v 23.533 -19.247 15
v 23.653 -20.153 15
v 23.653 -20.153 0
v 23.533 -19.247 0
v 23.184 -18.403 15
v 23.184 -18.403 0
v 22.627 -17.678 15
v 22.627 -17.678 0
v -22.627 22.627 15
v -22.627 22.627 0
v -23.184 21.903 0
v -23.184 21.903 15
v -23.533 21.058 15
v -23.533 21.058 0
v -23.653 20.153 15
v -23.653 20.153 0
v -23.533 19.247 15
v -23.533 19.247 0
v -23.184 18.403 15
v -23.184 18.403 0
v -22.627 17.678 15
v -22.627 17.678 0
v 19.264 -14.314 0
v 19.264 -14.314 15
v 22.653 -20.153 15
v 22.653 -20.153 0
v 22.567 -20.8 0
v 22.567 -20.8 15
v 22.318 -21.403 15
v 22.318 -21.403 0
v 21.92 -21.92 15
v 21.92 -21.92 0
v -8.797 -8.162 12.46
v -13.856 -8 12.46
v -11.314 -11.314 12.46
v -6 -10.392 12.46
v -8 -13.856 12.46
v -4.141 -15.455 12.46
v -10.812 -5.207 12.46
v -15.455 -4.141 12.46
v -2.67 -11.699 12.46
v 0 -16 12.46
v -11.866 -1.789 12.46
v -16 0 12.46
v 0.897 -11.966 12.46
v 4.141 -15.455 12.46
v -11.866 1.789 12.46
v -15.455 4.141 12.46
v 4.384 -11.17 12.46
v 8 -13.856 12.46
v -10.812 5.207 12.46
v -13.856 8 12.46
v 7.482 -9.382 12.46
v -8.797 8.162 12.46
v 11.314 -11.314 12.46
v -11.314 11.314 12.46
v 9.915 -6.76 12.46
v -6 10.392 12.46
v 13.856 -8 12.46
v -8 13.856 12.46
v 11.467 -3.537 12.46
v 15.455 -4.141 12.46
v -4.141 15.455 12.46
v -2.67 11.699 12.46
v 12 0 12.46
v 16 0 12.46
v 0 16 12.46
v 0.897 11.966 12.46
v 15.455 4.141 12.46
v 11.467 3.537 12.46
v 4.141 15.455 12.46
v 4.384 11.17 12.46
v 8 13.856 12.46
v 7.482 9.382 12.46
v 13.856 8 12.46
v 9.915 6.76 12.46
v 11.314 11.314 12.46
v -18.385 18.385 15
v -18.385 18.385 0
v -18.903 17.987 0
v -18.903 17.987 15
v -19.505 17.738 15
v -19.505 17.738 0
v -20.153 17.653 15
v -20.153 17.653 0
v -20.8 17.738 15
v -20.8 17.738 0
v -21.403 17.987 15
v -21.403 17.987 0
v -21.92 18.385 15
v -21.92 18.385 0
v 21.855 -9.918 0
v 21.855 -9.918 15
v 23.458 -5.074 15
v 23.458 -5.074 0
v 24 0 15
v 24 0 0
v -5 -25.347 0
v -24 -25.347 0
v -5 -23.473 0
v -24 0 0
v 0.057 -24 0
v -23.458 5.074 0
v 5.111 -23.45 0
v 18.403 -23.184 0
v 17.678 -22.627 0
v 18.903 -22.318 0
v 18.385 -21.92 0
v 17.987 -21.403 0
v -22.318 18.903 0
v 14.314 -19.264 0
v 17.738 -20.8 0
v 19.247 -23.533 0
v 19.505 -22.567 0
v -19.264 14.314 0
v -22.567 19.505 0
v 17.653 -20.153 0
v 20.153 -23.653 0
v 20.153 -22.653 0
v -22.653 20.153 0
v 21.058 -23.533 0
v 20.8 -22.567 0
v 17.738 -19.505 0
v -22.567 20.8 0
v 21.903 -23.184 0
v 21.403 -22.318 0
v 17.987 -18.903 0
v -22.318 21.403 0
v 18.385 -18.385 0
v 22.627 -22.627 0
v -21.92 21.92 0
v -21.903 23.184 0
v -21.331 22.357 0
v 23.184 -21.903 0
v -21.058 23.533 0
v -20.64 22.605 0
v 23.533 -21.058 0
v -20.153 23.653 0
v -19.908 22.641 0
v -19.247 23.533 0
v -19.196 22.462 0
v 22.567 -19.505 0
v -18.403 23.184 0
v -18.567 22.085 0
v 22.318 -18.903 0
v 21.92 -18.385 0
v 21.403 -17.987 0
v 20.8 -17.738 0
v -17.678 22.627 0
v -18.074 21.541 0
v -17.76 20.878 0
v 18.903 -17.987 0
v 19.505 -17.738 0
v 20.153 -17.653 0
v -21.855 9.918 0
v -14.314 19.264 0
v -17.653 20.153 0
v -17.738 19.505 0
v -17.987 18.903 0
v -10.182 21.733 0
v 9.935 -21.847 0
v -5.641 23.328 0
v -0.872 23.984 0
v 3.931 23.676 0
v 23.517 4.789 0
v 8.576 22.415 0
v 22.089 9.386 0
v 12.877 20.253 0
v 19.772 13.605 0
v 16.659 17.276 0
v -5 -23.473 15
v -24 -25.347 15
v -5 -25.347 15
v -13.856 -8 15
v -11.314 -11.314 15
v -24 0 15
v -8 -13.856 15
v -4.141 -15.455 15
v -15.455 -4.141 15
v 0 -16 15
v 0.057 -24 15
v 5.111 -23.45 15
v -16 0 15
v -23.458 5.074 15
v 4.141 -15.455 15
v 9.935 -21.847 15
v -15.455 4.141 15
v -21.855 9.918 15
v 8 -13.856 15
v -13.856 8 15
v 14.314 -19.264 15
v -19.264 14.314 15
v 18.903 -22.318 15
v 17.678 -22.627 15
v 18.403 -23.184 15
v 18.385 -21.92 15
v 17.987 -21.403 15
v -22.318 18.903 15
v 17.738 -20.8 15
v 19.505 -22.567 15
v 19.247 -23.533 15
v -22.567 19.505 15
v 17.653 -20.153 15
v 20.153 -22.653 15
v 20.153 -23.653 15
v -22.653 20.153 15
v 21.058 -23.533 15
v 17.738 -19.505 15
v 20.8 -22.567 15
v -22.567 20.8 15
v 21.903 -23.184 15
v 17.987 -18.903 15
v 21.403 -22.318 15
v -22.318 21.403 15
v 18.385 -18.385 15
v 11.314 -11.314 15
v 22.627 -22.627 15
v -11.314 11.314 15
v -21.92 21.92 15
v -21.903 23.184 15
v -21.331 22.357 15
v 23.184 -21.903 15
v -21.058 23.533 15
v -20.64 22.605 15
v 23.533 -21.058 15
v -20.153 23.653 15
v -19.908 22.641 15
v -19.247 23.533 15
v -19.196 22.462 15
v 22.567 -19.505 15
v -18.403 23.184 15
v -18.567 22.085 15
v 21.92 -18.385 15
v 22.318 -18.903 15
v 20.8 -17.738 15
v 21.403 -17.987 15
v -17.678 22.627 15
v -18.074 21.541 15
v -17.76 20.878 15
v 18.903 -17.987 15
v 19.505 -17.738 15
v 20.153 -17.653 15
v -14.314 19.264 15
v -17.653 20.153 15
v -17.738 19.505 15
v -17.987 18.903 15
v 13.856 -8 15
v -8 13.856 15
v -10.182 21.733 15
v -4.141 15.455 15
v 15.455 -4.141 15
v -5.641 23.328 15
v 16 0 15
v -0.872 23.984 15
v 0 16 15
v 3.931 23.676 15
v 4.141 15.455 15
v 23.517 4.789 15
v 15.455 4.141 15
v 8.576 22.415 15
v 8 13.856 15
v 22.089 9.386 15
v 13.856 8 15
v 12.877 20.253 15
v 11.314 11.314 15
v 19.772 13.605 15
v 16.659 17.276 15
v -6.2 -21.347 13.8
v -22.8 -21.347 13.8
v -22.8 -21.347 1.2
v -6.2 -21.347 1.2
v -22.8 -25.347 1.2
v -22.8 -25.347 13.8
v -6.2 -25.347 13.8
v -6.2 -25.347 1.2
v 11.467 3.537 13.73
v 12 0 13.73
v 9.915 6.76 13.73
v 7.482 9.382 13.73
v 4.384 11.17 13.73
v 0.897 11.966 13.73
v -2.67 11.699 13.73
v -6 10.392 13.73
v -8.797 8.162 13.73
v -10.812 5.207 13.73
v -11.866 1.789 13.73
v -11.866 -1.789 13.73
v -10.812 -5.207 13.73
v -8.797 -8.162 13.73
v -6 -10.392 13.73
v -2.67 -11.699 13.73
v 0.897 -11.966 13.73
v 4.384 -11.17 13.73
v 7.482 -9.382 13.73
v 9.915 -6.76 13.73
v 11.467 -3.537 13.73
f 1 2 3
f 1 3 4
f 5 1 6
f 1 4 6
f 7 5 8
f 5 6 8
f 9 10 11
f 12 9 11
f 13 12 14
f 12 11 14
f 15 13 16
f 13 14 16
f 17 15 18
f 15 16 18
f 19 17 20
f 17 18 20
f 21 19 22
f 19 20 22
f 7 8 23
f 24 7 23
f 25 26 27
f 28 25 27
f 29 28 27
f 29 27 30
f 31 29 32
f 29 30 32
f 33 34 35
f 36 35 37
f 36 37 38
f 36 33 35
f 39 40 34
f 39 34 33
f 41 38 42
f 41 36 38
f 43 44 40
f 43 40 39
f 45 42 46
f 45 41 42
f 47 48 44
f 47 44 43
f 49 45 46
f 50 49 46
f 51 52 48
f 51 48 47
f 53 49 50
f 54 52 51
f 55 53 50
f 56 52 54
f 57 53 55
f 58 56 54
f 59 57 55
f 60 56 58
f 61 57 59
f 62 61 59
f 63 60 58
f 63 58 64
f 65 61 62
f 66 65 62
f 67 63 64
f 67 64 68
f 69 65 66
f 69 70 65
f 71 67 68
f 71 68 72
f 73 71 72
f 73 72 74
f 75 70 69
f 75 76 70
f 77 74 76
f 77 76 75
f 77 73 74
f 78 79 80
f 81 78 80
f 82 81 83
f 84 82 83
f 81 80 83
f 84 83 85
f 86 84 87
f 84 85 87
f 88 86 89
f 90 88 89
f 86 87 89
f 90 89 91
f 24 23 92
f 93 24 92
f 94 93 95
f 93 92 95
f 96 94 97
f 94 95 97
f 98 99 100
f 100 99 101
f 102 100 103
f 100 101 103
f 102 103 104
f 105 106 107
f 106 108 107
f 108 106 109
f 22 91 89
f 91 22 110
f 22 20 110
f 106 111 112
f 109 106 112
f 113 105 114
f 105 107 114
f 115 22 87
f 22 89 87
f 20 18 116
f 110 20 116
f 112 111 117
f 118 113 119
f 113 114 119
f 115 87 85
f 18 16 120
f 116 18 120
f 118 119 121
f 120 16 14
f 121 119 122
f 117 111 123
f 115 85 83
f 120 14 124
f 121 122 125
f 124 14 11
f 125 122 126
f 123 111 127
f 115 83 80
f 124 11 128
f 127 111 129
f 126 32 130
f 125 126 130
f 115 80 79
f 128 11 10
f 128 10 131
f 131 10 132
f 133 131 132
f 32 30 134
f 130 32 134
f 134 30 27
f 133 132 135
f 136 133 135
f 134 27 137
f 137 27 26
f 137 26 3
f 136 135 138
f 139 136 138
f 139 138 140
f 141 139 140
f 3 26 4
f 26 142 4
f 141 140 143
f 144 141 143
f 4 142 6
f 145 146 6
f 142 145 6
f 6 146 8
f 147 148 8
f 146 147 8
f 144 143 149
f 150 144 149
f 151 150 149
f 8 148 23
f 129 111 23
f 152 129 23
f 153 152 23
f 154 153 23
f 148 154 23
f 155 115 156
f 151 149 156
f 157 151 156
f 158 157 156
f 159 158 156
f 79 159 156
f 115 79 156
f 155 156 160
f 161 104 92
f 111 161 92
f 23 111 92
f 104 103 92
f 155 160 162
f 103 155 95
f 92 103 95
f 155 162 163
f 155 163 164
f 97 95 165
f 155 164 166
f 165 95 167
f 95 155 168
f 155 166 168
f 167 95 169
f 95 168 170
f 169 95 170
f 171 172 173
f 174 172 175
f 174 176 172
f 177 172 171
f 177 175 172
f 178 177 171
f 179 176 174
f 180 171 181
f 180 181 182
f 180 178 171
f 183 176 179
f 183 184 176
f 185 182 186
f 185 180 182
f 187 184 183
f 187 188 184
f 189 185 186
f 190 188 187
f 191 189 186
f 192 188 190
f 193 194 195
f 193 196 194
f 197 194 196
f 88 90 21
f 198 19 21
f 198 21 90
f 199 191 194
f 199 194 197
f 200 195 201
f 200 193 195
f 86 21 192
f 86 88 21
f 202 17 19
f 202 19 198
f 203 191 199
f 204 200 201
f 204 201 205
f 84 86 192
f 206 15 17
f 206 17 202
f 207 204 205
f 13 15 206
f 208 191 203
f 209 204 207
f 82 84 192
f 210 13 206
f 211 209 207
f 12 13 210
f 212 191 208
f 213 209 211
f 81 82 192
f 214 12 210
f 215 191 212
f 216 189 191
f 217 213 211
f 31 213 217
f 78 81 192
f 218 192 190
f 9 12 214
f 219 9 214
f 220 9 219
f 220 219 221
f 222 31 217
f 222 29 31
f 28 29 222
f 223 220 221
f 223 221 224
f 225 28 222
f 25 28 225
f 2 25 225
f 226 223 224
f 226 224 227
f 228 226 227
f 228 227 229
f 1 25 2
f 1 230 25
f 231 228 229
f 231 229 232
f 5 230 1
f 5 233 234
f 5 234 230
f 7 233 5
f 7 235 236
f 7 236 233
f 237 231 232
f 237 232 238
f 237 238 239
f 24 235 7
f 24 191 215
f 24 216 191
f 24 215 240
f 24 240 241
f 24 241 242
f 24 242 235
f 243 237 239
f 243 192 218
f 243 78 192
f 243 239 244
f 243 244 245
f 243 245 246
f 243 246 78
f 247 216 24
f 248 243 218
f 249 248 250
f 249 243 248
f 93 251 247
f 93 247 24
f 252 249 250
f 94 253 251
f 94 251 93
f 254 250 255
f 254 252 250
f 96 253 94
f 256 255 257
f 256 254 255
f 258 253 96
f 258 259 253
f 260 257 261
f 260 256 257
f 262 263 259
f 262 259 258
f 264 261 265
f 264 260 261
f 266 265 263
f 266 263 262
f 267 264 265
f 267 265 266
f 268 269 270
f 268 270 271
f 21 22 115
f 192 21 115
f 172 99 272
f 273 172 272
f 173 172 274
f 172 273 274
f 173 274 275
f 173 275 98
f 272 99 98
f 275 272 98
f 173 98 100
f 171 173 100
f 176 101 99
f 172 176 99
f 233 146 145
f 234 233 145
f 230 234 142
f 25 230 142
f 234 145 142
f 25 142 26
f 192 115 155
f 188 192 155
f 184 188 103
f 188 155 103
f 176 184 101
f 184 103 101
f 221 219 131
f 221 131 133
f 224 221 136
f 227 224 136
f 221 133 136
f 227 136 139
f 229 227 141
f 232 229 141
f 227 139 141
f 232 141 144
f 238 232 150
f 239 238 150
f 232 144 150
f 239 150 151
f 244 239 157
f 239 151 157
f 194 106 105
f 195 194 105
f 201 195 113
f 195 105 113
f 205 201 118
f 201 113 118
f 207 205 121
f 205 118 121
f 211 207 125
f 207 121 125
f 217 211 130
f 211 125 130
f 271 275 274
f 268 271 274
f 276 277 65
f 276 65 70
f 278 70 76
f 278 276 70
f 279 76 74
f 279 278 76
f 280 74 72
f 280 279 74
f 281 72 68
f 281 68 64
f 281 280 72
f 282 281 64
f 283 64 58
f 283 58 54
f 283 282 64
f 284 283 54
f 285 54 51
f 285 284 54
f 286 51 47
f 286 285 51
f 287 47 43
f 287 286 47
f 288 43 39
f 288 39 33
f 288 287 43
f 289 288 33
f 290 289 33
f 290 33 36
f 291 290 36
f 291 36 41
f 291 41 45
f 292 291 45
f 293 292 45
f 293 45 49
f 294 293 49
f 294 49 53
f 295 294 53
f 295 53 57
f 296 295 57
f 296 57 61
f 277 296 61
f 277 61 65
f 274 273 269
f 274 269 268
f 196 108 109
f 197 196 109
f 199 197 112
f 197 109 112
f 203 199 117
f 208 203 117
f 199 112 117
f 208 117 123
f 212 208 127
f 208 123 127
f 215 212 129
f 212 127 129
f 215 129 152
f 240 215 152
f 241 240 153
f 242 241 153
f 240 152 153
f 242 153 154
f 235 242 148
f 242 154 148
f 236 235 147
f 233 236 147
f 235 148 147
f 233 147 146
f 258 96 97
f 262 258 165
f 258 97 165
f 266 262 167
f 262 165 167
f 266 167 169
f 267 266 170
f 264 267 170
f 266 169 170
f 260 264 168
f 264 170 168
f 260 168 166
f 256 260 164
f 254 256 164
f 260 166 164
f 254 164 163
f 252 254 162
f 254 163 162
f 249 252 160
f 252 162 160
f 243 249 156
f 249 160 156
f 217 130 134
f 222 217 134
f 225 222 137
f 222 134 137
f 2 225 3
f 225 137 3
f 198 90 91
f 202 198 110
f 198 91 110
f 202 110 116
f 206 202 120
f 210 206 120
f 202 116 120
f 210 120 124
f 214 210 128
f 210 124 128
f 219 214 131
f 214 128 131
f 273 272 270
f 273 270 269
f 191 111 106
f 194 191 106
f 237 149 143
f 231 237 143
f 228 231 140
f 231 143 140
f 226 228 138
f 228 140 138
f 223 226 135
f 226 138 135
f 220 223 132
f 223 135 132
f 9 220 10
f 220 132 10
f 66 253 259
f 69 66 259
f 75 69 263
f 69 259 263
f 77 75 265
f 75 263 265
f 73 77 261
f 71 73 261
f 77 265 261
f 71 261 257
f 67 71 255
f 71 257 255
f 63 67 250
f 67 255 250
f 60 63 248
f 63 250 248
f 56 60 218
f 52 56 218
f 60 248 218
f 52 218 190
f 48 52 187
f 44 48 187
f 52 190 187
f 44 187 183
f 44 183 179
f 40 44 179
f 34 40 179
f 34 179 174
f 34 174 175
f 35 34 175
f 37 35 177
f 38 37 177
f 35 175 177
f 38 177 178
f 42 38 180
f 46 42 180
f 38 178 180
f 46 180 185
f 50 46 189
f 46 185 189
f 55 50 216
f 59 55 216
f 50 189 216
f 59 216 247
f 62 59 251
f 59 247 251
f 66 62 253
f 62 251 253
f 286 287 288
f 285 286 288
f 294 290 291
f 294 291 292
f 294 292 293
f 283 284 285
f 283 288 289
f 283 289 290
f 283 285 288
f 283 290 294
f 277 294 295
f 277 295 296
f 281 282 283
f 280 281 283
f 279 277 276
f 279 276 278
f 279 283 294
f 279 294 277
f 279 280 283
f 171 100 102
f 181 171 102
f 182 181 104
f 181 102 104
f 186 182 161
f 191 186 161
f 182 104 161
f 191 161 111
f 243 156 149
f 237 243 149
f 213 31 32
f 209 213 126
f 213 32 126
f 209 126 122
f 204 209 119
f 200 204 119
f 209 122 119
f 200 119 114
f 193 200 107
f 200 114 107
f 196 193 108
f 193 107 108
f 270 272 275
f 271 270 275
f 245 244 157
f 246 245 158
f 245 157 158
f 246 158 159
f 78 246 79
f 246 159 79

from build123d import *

# Parameters (mm, degrees)
BOSS_EXTRUDE1_DEPTH = 15
SKETCH2_W           = 16.6
SKETCH2_H           = 12.6
CUT_EXTRUDE1_DEPTH  = 4
SKETCH3_R           = 16
SKETCH3_R_2         = 12
CUT_EXTRUDE2_DEPTH  = 2.54
SKETCH4_R           = 12
CUT_EXTRUDE3_DEPTH  = 1.27


with BuildPart() as part:
    # Sketch1 → Boss-Extrude1 (new body)
    with BuildSketch(Plane.XY):
        with BuildLine():
            ThreePointArc((-5, -23.473389189), (-18.654758106, -15.099668871), (-24, 0))
            Line((-24, 0), (-24, -25.347456736))
            Line((-24, -25.347456736), (-5, -25.347456736))
            Line((-5, -25.347456736), (-5, -23.473389189))
        make_face()
        with BuildLine():
            Line((-4.949747468, 0), (-19.264007125, 14.314259656))
            ThreePointArc((-19.264007125, 14.314259656), (-22.785260268, 7.538694483), (-24, 0))
            Line((-24, 0), (-4.949747468, 0))
        make_face()
        with BuildLine():
            Line((14.314259656, -19.264007125), (-4.949747468, 0))
            Line((-4.949747468, 0), (-24, 0))
            ThreePointArc((-24, 0), (-18.654758106, -15.099668871), (-5, -23.473389189))
            ThreePointArc((-5, -23.473389189), (5.110634264, -23.449550474), (14.314259656, -19.264007125))
        make_face()
        with BuildLine():
            Line((-4.949747468, 0), (-19.264007125, 14.314259656))
            ThreePointArc((-19.264007125, 14.314259656), (-22.785260268, 7.538694483), (-24, 0))
            Line((-24, 0), (-4.949747468, 0))
        make_face()
        with BuildLine():
            Line((14.314259656, -19.264007125), (-4.949747468, 0))
            Line((-4.949747468, 0), (-24, 0))
            ThreePointArc((-24, 0), (-18.654758106, -15.099668871), (-5, -23.473389189))
            ThreePointArc((-5, -23.473389189), (5.110634264, -23.449550474), (14.314259656, -19.264007125))
        make_face()
        with BuildLine():
            Line((0, 0), (-16.970562748, 16.970562748))
            ThreePointArc((-16.970562748, 16.970562748), (-18.165902125, 15.684387141), (-19.264007125, 14.314259656))
            Line((-19.264007125, 14.314259656), (-4.949747468, 0))
            Line((-4.949747468, 0), (0, 0))
        make_face()
        with BuildLine():
            Line((16.970562748, -16.970562748), (0, 0))
            Line((0, 0), (-4.949747468, 0))
            Line((-4.949747468, 0), (14.314259656, -19.264007125))
            ThreePointArc((14.314259656, -19.264007125), (15.684387141, -18.165902125), (16.970562748, -16.970562748))
        make_face()
        with BuildLine():
            ThreePointArc((-14.314259656, 19.264007125), (-15.684387141, 18.165902125), (-16.970562748, 16.970562748))
            Line((-16.970562748, 16.970562748), (0, 0))
            Line((0, 0), (16.970562748, -16.970562748))
            ThreePointArc((16.970562748, -16.970562748), (18.165902125, -15.684387141), (19.264007125, -14.314259656))
            Line((19.264007125, -14.314259656), (-14.314259656, 19.264007125))
        make_face()
        with BuildLine():
            ThreePointArc((24, 0), (10.780950057, 21.442274037), (-14.314259656, 19.264007125))
            Line((-14.314259656, 19.264007125), (19.264007125, -14.314259656))
            ThreePointArc((19.264007125, -14.314259656), (22.785260268, -7.538694483), (24, 0))
        make_face()
        with BuildLine():
            Line((-16.970562748, 16.970562748), (-17.67766953, 17.67766953))
            ThreePointArc((-17.67766953, 17.67766953), (-20.152543264, 16.652543264), (-22.627416998, 17.67766953))
            Line((-22.627416998, 17.67766953), (-19.264007125, 14.314259656))
            ThreePointArc((-19.264007125, 14.314259656), (-18.165902125, 15.684387141), (-16.970562748, 16.970562748))
        make_face()
        with BuildLine():
            ThreePointArc((-16.652543264, 20.152543264), (-16.9189649, 18.813151251), (-17.67766953, 17.67766953))
            Line((-17.67766953, 17.67766953), (-16.970562748, 16.970562748))
            ThreePointArc((-16.970562748, 16.970562748), (-15.684387141, 18.165902125), (-14.314259656, 19.264007125))
            Line((-14.314259656, 19.264007125), (-17.67766953, 22.627416998))
            ThreePointArc((-17.67766953, 22.627416998), (-16.9189649, 21.491935277), (-16.652543264, 20.152543264))
        make_face()
        with BuildLine():
            ThreePointArc((23.652543264, -20.152543264), (23.386121628, -18.813151251), (22.627416998, -17.67766953))
            Line((22.627416998, -17.67766953), (21.920310217, -18.384776311))
            ThreePointArc((21.920310217, -18.384776311), (22.462242095, -19.195834683), (22.652543264, -20.152543264))
            ThreePointArc((22.652543264, -20.152543264), (22.462242095, -21.109251845), (21.920310217, -21.920310217))
            Line((21.920310217, -21.920310217), (22.627416998, -22.627416998))
            ThreePointArc((22.627416998, -22.627416998), (23.386121628, -21.491935277), (23.652543264, -20.152543264))
        make_face()
        with BuildLine():
            Line((21.920310217, -18.384776311), (22.627416998, -17.67766953))
            ThreePointArc((22.627416998, -17.67766953), (20.152543264, -16.652543264), (17.67766953, -17.67766953))
            Line((17.67766953, -17.67766953), (18.384776311, -18.384776311))
            ThreePointArc((18.384776311, -18.384776311), (20.152543264, -17.652543264), (21.920310217, -18.384776311))
        make_face()
        with BuildLine():
            Line((18.384776311, -18.384776311), (17.67766953, -17.67766953))
            ThreePointArc((17.67766953, -17.67766953), (16.652543264, -20.152543264), (17.67766953, -22.627416998))
            Line((17.67766953, -22.627416998), (18.384776311, -21.920310217))
            ThreePointArc((18.384776311, -21.920310217), (17.652543264, -20.152543264), (18.384776311, -18.384776311))
        make_face()
        with BuildLine():
            Line((18.384776311, -21.920310217), (17.67766953, -22.627416998))
            ThreePointArc((17.67766953, -22.627416998), (20.152543264, -23.652543264), (22.627416998, -22.627416998))
            Line((22.627416998, -22.627416998), (21.920310217, -21.920310217))
            ThreePointArc((21.920310217, -21.920310217), (20.152543264, -22.652543264), (18.384776311, -21.920310217))
        make_face()
        with BuildLine():
            ThreePointArc((23.652543264, -20.152543264), (23.386121628, -18.813151251), (22.627416998, -17.67766953))
            Line((22.627416998, -17.67766953), (21.920310217, -18.384776311))
            ThreePointArc((21.920310217, -18.384776311), (22.462242095, -19.195834683), (22.652543264, -20.152543264))
            ThreePointArc((22.652543264, -20.152543264), (22.462242095, -21.109251845), (21.920310217, -21.920310217))
            Line((21.920310217, -21.920310217), (22.627416998, -22.627416998))
            ThreePointArc((22.627416998, -22.627416998), (23.386121628, -21.491935277), (23.652543264, -20.152543264))
        make_face()
        with BuildLine():
            Line((21.920310217, -18.384776311), (22.627416998, -17.67766953))
            ThreePointArc((22.627416998, -17.67766953), (20.152543264, -16.652543264), (17.67766953, -17.67766953))
            Line((17.67766953, -17.67766953), (18.384776311, -18.384776311))
            ThreePointArc((18.384776311, -18.384776311), (20.152543264, -17.652543264), (21.920310217, -18.384776311))
        make_face()
        with BuildLine():
            Line((18.384776311, -18.384776311), (17.67766953, -17.67766953))
            ThreePointArc((17.67766953, -17.67766953), (16.652543264, -20.152543264), (17.67766953, -22.627416998))
            Line((17.67766953, -22.627416998), (18.384776311, -21.920310217))
            ThreePointArc((18.384776311, -21.920310217), (17.652543264, -20.152543264), (18.384776311, -18.384776311))
        make_face()
        with BuildLine():
            Line((18.384776311, -21.920310217), (17.67766953, -22.627416998))
            ThreePointArc((17.67766953, -22.627416998), (20.152543264, -23.652543264), (22.627416998, -22.627416998))
            Line((22.627416998, -22.627416998), (21.920310217, -21.920310217))
            ThreePointArc((21.920310217, -21.920310217), (20.152543264, -22.652543264), (18.384776311, -21.920310217))
        make_face()
        with BuildLine():
            Line((17.67766953, -17.67766953), (16.970562748, -16.970562748))
            ThreePointArc((16.970562748, -16.970562748), (15.684387141, -18.165902125), (14.314259656, -19.264007125))
            Line((14.314259656, -19.264007125), (17.67766953, -22.627416998))
            ThreePointArc((17.67766953, -22.627416998), (16.652543264, -20.152543264), (17.67766953, -17.67766953))
        make_face()
        with BuildLine():
            Line((22.627416998, -17.67766953), (19.264007125, -14.314259656))
            ThreePointArc((19.264007125, -14.314259656), (18.165902125, -15.684387141), (16.970562748, -16.970562748))
            Line((16.970562748, -16.970562748), (17.67766953, -17.67766953))
            ThreePointArc((17.67766953, -17.67766953), (20.152543264, -16.652543264), (22.627416998, -17.67766953))
        make_face()
        with BuildLine():
            ThreePointArc((23.652543264, -20.152543264), (23.386121628, -18.813151251), (22.627416998, -17.67766953))
            Line((22.627416998, -17.67766953), (21.920310217, -18.384776311))
            ThreePointArc((21.920310217, -18.384776311), (22.462242095, -19.195834683), (22.652543264, -20.152543264))
            ThreePointArc((22.652543264, -20.152543264), (22.462242095, -21.109251845), (21.920310217, -21.920310217))
            Line((21.920310217, -21.920310217), (22.627416998, -22.627416998))
            ThreePointArc((22.627416998, -22.627416998), (23.386121628, -21.491935277), (23.652543264, -20.152543264))
        make_face()
        with BuildLine():
            Line((21.920310217, -18.384776311), (22.627416998, -17.67766953))
            ThreePointArc((22.627416998, -17.67766953), (20.152543264, -16.652543264), (17.67766953, -17.67766953))
            Line((17.67766953, -17.67766953), (18.384776311, -18.384776311))
            ThreePointArc((18.384776311, -18.384776311), (20.152543264, -17.652543264), (21.920310217, -18.384776311))
        make_face()
        with BuildLine():
            Line((18.384776311, -18.384776311), (17.67766953, -17.67766953))
            ThreePointArc((17.67766953, -17.67766953), (16.652543264, -20.152543264), (17.67766953, -22.627416998))
            Line((17.67766953, -22.627416998), (18.384776311, -21.920310217))
            ThreePointArc((18.384776311, -21.920310217), (17.652543264, -20.152543264), (18.384776311, -18.384776311))
        make_face()
        with BuildLine():
            Line((18.384776311, -21.920310217), (17.67766953, -22.627416998))
            ThreePointArc((17.67766953, -22.627416998), (20.152543264, -23.652543264), (22.627416998, -22.627416998))
            Line((22.627416998, -22.627416998), (21.920310217, -21.920310217))
            ThreePointArc((21.920310217, -21.920310217), (20.152543264, -22.652543264), (18.384776311, -21.920310217))
        make_face()
        with BuildLine():
            ThreePointArc((23.652543264, -20.152543264), (23.386121628, -18.813151251), (22.627416998, -17.67766953))
            Line((22.627416998, -17.67766953), (21.920310217, -18.384776311))
            ThreePointArc((21.920310217, -18.384776311), (22.462242095, -19.195834683), (22.652543264, -20.152543264))
            ThreePointArc((22.652543264, -20.152543264), (22.462242095, -21.109251845), (21.920310217, -21.920310217))
            Line((21.920310217, -21.920310217), (22.627416998, -22.627416998))
            ThreePointArc((22.627416998, -22.627416998), (23.386121628, -21.491935277), (23.652543264, -20.152543264))
        make_face()
        with BuildLine():
            Line((21.920310217, -18.384776311), (22.627416998, -17.67766953))
            ThreePointArc((22.627416998, -17.67766953), (20.152543264, -16.652543264), (17.67766953, -17.67766953))
            Line((17.67766953, -17.67766953), (18.384776311, -18.384776311))
            ThreePointArc((18.384776311, -18.384776311), (20.152543264, -17.652543264), (21.920310217, -18.384776311))
        make_face()
        with BuildLine():
            Line((18.384776311, -18.384776311), (17.67766953, -17.67766953))
            ThreePointArc((17.67766953, -17.67766953), (16.652543264, -20.152543264), (17.67766953, -22.627416998))
            Line((17.67766953, -22.627416998), (18.384776311, -21.920310217))
            ThreePointArc((18.384776311, -21.920310217), (17.652543264, -20.152543264), (18.384776311, -18.384776311))
        make_face()
        with BuildLine():
            Line((18.384776311, -21.920310217), (17.67766953, -22.627416998))
            ThreePointArc((17.67766953, -22.627416998), (20.152543264, -23.652543264), (22.627416998, -22.627416998))
            Line((22.627416998, -22.627416998), (21.920310217, -21.920310217))
            ThreePointArc((21.920310217, -21.920310217), (20.152543264, -22.652543264), (18.384776311, -21.920310217))
        make_face()
        with BuildLine():
            ThreePointArc((-21.920310217, 18.384776311), (-22.652543264, 20.152543264), (-21.920310217, 21.920310217))
            Line((-21.920310217, 21.920310217), (-22.627416998, 22.627416998))
            ThreePointArc((-22.627416998, 22.627416998), (-23.652543264, 20.152543264), (-22.627416998, 17.67766953))
            Line((-22.627416998, 17.67766953), (-21.920310217, 18.384776311))
        make_face()
        with BuildLine():
            Line((-17.67766953, 17.67766953), (-18.384776311, 18.384776311))
            ThreePointArc((-18.384776311, 18.384776311), (-20.152543264, 17.652543264), (-21.920310217, 18.384776311))
            Line((-21.920310217, 18.384776311), (-22.627416998, 17.67766953))
            ThreePointArc((-22.627416998, 17.67766953), (-20.152543264, 16.652543264), (-17.67766953, 17.67766953))
        make_face()
        with BuildLine():
            Line((-22.627416998, 22.627416998), (-21.920310217, 21.920310217))
            ThreePointArc((-21.920310217, 21.920310217), (-19.195834683, 22.462242095), (-17.652543264, 20.152543264))
            ThreePointArc((-17.652543264, 20.152543264), (-17.842844433, 19.195834683), (-18.384776311, 18.384776311))
            Line((-18.384776311, 18.384776311), (-17.67766953, 17.67766953))
            ThreePointArc((-17.67766953, 17.67766953), (-16.9189649, 18.813151251), (-16.652543264, 20.152543264))
            ThreePointArc((-16.652543264, 20.152543264), (-16.9189649, 21.491935277), (-17.67766953, 22.627416998))
            ThreePointArc((-17.67766953, 22.627416998), (-20.152543264, 23.652543264), (-22.627416998, 22.627416998))
        make_face()
        with BuildLine():
            ThreePointArc((-21.920310217, 18.384776311), (-22.652543264, 20.152543264), (-21.920310217, 21.920310217))
            Line((-21.920310217, 21.920310217), (-22.627416998, 22.627416998))
            ThreePointArc((-22.627416998, 22.627416998), (-23.652543264, 20.152543264), (-22.627416998, 17.67766953))
            Line((-22.627416998, 17.67766953), (-21.920310217, 18.384776311))
        make_face()
        with BuildLine():
            Line((-17.67766953, 17.67766953), (-18.384776311, 18.384776311))
            ThreePointArc((-18.384776311, 18.384776311), (-20.152543264, 17.652543264), (-21.920310217, 18.384776311))
            Line((-21.920310217, 18.384776311), (-22.627416998, 17.67766953))
            ThreePointArc((-22.627416998, 17.67766953), (-20.152543264, 16.652543264), (-17.67766953, 17.67766953))
        make_face()
    extrude(amount=BOSS_EXTRUDE1_DEPTH)

    # Sketch2 → Cut-Extrude1 (cut)
    with BuildSketch(Plane.XZ.offset(25.347456736)):
        with Locations((-14.5, 7.5)):
            Rectangle(SKETCH2_W, SKETCH2_H)
    extrude(amount=-CUT_EXTRUDE1_DEPTH, mode=Mode.SUBTRACT)

    # Sketch3 → Cut-Extrude2 (cut)
    with BuildSketch(Plane.XY.offset(15)):
        Circle(SKETCH3_R)
        Circle(SKETCH3_R_2, mode=Mode.SUBTRACT)
    extrude(amount=-CUT_EXTRUDE2_DEPTH, mode=Mode.SUBTRACT)

    # Sketch4 → Cut-Extrude3 (cut)
    with BuildSketch(Plane.XY.offset(15)):
        Circle(SKETCH4_R)
    extrude(amount=-CUT_EXTRUDE3_DEPTH, mode=Mode.SUBTRACT)


solid = part.part
